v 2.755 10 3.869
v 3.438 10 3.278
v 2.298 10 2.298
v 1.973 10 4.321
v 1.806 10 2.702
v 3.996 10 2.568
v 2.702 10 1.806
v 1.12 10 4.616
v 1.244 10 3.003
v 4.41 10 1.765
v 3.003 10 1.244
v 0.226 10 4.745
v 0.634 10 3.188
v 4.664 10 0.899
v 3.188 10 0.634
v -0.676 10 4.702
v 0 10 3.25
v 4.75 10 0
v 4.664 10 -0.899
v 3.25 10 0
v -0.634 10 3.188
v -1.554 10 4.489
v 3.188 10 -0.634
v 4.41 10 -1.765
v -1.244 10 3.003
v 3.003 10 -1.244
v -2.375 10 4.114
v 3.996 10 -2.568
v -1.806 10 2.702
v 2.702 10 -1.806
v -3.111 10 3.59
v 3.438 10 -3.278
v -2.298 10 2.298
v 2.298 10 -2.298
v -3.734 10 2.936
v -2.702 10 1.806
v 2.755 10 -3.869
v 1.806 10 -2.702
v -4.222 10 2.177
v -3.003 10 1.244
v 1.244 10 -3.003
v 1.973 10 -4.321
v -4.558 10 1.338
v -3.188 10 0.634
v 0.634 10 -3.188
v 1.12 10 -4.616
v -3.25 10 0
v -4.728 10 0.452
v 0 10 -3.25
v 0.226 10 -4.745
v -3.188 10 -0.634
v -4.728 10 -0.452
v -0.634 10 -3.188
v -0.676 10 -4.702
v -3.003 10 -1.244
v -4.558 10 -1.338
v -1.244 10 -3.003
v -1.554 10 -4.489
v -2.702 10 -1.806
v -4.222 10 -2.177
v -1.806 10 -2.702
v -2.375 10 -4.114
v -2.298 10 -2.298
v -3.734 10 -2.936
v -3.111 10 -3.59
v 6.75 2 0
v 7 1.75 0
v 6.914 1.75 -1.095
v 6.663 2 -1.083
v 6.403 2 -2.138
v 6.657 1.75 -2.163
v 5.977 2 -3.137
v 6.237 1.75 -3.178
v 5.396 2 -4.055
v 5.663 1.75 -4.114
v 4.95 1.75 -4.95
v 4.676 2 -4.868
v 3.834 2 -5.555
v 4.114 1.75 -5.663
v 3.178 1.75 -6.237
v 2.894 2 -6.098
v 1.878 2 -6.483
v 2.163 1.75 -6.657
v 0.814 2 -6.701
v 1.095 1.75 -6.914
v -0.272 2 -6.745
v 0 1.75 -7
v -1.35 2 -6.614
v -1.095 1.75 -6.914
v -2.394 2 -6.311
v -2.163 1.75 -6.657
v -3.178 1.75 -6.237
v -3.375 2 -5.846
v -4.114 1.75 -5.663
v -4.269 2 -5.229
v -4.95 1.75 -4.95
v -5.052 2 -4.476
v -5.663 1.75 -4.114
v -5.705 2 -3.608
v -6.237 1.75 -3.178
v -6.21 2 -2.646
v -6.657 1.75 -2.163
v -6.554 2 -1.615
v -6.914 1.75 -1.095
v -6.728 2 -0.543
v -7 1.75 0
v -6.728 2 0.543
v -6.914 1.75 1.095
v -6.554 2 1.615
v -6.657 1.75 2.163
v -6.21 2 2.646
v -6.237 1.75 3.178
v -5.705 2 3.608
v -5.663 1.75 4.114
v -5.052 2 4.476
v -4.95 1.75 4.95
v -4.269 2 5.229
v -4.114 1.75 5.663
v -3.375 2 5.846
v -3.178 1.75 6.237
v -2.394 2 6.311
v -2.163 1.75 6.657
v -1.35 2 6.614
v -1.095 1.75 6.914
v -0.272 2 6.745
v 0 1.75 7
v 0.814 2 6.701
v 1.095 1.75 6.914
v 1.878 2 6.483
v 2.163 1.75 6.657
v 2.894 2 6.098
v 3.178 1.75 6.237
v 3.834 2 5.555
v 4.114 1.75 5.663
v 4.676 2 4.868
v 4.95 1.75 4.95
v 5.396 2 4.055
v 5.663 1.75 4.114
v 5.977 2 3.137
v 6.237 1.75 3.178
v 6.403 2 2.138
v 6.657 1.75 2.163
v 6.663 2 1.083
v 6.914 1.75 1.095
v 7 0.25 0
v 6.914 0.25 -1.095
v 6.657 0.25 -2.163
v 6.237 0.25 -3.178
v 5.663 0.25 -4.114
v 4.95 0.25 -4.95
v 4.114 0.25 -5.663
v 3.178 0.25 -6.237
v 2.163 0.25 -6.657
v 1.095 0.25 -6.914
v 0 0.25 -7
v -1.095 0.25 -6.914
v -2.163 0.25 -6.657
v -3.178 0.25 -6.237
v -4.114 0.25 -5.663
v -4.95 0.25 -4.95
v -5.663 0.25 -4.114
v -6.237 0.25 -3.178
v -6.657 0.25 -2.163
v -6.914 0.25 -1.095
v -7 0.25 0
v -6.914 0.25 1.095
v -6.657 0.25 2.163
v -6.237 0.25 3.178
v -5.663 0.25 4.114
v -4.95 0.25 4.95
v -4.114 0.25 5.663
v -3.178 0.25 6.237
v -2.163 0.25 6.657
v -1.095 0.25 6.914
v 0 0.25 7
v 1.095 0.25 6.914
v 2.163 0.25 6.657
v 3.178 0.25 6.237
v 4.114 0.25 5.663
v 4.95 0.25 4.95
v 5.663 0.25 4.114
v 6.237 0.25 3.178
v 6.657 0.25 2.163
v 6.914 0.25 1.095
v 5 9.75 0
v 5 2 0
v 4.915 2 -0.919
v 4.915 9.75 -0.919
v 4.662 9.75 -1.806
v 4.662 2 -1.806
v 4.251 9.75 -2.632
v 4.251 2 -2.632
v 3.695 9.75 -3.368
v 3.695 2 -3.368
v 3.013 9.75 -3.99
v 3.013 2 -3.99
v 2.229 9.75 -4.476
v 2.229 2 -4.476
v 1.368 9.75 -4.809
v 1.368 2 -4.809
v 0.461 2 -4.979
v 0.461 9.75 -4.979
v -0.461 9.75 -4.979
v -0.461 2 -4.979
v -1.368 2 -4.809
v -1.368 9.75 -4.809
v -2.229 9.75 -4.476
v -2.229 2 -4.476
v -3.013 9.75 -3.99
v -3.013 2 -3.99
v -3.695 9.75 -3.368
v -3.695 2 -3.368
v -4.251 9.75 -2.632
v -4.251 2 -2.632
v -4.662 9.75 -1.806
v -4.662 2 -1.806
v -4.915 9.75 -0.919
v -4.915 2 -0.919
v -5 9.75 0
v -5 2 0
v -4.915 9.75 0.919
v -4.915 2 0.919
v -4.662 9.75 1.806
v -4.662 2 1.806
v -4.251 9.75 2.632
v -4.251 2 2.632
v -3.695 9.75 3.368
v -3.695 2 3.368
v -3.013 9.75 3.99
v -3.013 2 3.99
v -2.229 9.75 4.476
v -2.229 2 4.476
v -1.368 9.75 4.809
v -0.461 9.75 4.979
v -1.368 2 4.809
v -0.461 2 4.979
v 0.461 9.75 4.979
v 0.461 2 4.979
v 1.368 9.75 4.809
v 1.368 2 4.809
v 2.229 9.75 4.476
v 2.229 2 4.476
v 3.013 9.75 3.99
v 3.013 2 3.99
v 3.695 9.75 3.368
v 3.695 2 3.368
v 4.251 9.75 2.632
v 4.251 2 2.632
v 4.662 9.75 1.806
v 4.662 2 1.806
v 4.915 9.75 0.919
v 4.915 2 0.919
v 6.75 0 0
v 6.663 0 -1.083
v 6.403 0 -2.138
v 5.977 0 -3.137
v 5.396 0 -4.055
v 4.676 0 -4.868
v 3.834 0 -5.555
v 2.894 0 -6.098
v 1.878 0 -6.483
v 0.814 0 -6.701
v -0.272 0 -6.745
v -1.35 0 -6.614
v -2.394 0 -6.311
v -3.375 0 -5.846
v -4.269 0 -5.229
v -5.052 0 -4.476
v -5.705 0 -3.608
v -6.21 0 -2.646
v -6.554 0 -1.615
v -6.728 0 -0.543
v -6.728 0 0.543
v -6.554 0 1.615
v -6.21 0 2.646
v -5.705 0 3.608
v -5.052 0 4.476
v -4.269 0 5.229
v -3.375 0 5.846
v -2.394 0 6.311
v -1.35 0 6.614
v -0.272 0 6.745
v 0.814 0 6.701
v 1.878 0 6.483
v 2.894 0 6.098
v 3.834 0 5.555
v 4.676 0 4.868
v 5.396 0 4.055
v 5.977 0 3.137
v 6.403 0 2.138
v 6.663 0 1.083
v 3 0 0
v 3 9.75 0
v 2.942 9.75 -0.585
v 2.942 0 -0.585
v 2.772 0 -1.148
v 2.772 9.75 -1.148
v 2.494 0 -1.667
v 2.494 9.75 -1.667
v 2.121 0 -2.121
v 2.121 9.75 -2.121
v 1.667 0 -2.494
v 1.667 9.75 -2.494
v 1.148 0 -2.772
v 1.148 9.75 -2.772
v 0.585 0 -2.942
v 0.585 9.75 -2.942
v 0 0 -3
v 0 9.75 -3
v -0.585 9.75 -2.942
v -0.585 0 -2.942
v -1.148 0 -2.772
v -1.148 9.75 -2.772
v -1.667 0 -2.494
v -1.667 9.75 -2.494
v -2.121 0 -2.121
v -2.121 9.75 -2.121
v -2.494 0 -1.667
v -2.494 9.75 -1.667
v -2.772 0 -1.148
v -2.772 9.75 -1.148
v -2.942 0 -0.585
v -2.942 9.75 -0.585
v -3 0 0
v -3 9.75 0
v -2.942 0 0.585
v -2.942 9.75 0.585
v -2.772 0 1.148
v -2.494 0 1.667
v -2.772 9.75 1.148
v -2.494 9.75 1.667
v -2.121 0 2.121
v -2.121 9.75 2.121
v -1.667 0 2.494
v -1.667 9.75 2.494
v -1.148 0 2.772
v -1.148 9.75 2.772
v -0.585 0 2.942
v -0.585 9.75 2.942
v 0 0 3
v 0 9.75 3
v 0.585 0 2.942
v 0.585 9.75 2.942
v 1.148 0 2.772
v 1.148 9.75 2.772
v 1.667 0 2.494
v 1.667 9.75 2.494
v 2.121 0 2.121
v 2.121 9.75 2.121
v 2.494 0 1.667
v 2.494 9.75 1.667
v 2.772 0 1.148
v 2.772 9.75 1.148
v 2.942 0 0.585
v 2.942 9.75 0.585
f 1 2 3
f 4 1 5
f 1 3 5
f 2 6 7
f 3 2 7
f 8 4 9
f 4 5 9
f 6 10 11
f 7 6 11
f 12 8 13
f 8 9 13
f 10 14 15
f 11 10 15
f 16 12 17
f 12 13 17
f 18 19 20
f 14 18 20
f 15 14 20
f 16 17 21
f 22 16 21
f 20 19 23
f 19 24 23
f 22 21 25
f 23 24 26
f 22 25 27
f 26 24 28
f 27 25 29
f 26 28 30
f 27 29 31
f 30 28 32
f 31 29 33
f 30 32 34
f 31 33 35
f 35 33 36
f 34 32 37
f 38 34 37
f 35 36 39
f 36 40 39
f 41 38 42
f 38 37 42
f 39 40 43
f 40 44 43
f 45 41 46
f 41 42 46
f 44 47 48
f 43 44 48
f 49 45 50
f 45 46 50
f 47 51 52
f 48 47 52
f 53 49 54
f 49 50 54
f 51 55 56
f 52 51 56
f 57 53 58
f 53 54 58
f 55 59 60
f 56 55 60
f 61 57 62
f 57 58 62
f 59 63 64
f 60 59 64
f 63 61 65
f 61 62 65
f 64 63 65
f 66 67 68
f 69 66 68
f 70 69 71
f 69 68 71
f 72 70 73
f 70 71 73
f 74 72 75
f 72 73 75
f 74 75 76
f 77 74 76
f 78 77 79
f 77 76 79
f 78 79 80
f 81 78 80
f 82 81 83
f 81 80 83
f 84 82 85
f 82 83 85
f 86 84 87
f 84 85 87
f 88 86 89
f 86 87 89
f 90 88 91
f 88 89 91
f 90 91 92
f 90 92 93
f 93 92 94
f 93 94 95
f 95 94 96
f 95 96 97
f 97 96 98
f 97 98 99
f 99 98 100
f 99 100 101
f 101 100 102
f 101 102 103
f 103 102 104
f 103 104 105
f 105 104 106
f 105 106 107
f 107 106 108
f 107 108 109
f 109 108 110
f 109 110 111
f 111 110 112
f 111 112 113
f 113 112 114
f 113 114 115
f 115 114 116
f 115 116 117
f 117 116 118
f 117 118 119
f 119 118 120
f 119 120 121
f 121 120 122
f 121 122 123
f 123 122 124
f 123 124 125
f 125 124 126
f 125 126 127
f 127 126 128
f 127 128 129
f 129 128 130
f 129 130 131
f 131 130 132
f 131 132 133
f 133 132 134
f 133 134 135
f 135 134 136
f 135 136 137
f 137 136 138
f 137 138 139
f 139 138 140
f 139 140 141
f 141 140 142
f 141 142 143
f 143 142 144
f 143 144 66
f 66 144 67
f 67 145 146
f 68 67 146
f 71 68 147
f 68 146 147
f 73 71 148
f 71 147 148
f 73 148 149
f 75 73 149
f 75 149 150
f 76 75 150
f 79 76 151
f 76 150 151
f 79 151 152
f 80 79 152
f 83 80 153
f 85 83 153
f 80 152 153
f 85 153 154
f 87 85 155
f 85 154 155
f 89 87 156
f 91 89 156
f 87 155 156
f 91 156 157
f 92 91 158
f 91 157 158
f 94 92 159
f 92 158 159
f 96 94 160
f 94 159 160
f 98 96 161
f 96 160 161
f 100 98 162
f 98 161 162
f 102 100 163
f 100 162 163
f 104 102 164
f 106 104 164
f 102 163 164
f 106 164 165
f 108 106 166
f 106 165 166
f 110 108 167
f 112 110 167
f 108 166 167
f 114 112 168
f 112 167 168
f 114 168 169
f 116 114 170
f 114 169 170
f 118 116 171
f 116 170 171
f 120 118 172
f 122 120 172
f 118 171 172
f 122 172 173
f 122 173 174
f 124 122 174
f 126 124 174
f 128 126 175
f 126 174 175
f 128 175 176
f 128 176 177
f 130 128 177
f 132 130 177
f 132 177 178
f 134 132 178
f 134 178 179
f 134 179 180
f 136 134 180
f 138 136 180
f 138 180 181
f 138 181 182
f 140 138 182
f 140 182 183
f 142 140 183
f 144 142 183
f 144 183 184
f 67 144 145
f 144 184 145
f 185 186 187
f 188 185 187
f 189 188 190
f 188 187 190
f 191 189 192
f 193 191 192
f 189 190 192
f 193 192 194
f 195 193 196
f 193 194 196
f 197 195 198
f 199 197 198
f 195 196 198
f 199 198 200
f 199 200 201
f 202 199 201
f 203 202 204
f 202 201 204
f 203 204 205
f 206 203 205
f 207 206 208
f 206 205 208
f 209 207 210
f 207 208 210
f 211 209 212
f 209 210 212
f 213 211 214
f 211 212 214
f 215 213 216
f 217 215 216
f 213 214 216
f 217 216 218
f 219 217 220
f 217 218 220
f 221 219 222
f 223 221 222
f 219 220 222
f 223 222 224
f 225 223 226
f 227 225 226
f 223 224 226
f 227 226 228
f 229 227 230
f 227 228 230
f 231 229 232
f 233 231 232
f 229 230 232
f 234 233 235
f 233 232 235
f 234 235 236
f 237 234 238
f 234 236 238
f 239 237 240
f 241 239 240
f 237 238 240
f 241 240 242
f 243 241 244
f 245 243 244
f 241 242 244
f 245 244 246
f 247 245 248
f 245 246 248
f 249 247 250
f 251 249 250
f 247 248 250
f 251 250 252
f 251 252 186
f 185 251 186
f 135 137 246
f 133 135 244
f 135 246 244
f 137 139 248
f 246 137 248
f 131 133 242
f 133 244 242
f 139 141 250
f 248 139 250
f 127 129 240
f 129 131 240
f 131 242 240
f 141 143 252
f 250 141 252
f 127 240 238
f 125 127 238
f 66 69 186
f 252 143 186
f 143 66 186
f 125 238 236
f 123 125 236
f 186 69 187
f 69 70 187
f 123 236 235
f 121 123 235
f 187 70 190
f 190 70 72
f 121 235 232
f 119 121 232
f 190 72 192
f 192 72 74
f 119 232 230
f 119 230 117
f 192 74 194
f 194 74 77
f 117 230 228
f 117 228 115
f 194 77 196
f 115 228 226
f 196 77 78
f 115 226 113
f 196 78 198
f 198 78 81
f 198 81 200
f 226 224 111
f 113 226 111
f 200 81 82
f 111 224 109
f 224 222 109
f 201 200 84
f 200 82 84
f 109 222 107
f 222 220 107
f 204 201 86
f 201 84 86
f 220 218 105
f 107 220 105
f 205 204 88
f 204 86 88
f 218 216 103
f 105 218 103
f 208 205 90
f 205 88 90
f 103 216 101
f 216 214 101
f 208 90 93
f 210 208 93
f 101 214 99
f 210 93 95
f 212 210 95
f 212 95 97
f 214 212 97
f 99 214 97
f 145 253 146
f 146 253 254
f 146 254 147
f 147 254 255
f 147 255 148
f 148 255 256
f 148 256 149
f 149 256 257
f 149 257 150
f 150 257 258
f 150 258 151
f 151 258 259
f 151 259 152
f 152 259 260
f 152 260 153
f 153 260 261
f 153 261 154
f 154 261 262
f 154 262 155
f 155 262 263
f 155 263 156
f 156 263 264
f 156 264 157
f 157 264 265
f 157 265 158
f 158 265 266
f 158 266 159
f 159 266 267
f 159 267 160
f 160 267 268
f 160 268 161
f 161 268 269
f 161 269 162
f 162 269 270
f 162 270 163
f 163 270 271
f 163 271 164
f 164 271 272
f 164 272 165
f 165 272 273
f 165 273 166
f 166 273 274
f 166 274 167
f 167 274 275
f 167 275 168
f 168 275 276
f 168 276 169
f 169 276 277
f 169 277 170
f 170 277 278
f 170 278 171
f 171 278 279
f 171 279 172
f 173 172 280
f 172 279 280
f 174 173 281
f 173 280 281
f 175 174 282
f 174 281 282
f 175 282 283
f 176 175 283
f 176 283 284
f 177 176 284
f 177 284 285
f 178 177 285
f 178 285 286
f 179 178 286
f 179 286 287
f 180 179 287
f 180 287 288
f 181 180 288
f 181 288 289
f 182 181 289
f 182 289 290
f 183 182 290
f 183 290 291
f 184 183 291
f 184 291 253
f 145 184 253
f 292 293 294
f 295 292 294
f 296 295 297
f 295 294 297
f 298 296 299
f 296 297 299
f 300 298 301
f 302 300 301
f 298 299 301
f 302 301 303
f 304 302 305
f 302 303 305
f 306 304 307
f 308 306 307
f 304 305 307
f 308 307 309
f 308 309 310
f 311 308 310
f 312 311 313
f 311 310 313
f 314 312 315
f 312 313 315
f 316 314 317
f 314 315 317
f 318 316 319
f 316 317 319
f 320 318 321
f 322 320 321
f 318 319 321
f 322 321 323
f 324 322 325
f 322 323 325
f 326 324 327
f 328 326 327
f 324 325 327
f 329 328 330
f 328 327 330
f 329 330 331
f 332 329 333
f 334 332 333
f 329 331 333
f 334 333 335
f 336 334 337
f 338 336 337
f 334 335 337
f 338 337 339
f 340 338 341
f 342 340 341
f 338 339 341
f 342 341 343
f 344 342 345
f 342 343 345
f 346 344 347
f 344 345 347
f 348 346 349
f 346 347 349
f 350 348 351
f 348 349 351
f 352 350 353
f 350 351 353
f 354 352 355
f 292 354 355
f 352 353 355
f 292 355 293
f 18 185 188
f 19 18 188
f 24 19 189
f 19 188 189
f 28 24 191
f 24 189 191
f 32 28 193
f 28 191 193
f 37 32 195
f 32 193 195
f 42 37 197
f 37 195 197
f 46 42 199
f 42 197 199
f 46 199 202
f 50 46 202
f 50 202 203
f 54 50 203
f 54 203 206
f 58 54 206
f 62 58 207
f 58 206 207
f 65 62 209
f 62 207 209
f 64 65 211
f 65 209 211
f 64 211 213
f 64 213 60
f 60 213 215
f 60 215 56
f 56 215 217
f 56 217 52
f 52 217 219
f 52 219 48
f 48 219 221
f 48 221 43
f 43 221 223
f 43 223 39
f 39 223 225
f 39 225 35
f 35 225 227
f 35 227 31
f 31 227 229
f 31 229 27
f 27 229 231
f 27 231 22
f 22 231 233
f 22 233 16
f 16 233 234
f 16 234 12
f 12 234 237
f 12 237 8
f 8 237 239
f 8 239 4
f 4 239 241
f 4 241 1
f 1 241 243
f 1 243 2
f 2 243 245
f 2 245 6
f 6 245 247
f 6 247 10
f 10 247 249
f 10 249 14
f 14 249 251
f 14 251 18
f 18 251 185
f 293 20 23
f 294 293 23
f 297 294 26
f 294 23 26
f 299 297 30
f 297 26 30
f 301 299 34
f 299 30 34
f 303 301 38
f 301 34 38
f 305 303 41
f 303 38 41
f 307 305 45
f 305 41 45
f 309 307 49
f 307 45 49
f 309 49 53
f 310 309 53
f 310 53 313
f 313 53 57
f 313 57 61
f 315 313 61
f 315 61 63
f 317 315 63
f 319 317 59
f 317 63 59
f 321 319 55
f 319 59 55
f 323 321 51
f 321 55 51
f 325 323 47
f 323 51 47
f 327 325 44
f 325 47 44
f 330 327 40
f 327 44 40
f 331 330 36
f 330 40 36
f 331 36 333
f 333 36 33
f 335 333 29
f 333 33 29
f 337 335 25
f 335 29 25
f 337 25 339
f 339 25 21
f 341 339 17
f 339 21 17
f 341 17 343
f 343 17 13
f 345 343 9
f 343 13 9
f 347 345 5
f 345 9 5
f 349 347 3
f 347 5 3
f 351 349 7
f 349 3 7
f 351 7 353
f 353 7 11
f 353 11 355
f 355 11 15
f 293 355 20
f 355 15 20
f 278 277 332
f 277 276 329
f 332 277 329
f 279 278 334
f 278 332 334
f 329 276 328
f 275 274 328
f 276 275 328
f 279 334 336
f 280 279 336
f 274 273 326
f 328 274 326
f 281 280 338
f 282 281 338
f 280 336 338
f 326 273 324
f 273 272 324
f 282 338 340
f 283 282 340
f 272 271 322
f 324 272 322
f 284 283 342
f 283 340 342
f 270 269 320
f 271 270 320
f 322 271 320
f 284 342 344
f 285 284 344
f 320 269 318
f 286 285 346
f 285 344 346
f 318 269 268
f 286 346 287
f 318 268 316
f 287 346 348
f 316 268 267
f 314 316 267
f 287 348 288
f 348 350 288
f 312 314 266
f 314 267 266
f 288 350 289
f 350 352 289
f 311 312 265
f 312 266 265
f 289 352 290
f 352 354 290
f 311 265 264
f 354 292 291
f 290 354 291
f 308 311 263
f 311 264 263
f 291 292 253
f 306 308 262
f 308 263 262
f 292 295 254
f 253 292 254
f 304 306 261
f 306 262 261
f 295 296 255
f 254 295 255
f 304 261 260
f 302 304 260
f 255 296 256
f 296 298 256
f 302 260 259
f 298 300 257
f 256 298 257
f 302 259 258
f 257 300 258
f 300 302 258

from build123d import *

# Parameters (mm, degrees)
CHAMFER1_SIZE = 0.25


with BuildPart() as part:
    # Sketch1 → Revolve1 (revolve)
    with BuildSketch(Plane.XY, mode=Mode.PRIVATE) as revolve1_sk:
        Polygon((-3, 0), (-3, 10), (-5, 10), (-5, 2), (-7, 2), (-7, 0), align=None)
    revolve(revolve1_sk.sketch.rotate(Axis((0, -356.558848917, 0), (0, 1, 0)), 180), axis=Axis((0, -356.558848917, 0), (0, 1, 0)))

    # Chamfer1
    chamfer1_edges = [part.edges().sort_by_distance(p)[0] for p in [
        (-7, 0, 0),
        (-7, 2, 0),
        (-5, 10, 0),
        (-3, 10, 0),
    ]]
    chamfer(chamfer1_edges, length=CHAMFER1_SIZE)


solid = part.part
